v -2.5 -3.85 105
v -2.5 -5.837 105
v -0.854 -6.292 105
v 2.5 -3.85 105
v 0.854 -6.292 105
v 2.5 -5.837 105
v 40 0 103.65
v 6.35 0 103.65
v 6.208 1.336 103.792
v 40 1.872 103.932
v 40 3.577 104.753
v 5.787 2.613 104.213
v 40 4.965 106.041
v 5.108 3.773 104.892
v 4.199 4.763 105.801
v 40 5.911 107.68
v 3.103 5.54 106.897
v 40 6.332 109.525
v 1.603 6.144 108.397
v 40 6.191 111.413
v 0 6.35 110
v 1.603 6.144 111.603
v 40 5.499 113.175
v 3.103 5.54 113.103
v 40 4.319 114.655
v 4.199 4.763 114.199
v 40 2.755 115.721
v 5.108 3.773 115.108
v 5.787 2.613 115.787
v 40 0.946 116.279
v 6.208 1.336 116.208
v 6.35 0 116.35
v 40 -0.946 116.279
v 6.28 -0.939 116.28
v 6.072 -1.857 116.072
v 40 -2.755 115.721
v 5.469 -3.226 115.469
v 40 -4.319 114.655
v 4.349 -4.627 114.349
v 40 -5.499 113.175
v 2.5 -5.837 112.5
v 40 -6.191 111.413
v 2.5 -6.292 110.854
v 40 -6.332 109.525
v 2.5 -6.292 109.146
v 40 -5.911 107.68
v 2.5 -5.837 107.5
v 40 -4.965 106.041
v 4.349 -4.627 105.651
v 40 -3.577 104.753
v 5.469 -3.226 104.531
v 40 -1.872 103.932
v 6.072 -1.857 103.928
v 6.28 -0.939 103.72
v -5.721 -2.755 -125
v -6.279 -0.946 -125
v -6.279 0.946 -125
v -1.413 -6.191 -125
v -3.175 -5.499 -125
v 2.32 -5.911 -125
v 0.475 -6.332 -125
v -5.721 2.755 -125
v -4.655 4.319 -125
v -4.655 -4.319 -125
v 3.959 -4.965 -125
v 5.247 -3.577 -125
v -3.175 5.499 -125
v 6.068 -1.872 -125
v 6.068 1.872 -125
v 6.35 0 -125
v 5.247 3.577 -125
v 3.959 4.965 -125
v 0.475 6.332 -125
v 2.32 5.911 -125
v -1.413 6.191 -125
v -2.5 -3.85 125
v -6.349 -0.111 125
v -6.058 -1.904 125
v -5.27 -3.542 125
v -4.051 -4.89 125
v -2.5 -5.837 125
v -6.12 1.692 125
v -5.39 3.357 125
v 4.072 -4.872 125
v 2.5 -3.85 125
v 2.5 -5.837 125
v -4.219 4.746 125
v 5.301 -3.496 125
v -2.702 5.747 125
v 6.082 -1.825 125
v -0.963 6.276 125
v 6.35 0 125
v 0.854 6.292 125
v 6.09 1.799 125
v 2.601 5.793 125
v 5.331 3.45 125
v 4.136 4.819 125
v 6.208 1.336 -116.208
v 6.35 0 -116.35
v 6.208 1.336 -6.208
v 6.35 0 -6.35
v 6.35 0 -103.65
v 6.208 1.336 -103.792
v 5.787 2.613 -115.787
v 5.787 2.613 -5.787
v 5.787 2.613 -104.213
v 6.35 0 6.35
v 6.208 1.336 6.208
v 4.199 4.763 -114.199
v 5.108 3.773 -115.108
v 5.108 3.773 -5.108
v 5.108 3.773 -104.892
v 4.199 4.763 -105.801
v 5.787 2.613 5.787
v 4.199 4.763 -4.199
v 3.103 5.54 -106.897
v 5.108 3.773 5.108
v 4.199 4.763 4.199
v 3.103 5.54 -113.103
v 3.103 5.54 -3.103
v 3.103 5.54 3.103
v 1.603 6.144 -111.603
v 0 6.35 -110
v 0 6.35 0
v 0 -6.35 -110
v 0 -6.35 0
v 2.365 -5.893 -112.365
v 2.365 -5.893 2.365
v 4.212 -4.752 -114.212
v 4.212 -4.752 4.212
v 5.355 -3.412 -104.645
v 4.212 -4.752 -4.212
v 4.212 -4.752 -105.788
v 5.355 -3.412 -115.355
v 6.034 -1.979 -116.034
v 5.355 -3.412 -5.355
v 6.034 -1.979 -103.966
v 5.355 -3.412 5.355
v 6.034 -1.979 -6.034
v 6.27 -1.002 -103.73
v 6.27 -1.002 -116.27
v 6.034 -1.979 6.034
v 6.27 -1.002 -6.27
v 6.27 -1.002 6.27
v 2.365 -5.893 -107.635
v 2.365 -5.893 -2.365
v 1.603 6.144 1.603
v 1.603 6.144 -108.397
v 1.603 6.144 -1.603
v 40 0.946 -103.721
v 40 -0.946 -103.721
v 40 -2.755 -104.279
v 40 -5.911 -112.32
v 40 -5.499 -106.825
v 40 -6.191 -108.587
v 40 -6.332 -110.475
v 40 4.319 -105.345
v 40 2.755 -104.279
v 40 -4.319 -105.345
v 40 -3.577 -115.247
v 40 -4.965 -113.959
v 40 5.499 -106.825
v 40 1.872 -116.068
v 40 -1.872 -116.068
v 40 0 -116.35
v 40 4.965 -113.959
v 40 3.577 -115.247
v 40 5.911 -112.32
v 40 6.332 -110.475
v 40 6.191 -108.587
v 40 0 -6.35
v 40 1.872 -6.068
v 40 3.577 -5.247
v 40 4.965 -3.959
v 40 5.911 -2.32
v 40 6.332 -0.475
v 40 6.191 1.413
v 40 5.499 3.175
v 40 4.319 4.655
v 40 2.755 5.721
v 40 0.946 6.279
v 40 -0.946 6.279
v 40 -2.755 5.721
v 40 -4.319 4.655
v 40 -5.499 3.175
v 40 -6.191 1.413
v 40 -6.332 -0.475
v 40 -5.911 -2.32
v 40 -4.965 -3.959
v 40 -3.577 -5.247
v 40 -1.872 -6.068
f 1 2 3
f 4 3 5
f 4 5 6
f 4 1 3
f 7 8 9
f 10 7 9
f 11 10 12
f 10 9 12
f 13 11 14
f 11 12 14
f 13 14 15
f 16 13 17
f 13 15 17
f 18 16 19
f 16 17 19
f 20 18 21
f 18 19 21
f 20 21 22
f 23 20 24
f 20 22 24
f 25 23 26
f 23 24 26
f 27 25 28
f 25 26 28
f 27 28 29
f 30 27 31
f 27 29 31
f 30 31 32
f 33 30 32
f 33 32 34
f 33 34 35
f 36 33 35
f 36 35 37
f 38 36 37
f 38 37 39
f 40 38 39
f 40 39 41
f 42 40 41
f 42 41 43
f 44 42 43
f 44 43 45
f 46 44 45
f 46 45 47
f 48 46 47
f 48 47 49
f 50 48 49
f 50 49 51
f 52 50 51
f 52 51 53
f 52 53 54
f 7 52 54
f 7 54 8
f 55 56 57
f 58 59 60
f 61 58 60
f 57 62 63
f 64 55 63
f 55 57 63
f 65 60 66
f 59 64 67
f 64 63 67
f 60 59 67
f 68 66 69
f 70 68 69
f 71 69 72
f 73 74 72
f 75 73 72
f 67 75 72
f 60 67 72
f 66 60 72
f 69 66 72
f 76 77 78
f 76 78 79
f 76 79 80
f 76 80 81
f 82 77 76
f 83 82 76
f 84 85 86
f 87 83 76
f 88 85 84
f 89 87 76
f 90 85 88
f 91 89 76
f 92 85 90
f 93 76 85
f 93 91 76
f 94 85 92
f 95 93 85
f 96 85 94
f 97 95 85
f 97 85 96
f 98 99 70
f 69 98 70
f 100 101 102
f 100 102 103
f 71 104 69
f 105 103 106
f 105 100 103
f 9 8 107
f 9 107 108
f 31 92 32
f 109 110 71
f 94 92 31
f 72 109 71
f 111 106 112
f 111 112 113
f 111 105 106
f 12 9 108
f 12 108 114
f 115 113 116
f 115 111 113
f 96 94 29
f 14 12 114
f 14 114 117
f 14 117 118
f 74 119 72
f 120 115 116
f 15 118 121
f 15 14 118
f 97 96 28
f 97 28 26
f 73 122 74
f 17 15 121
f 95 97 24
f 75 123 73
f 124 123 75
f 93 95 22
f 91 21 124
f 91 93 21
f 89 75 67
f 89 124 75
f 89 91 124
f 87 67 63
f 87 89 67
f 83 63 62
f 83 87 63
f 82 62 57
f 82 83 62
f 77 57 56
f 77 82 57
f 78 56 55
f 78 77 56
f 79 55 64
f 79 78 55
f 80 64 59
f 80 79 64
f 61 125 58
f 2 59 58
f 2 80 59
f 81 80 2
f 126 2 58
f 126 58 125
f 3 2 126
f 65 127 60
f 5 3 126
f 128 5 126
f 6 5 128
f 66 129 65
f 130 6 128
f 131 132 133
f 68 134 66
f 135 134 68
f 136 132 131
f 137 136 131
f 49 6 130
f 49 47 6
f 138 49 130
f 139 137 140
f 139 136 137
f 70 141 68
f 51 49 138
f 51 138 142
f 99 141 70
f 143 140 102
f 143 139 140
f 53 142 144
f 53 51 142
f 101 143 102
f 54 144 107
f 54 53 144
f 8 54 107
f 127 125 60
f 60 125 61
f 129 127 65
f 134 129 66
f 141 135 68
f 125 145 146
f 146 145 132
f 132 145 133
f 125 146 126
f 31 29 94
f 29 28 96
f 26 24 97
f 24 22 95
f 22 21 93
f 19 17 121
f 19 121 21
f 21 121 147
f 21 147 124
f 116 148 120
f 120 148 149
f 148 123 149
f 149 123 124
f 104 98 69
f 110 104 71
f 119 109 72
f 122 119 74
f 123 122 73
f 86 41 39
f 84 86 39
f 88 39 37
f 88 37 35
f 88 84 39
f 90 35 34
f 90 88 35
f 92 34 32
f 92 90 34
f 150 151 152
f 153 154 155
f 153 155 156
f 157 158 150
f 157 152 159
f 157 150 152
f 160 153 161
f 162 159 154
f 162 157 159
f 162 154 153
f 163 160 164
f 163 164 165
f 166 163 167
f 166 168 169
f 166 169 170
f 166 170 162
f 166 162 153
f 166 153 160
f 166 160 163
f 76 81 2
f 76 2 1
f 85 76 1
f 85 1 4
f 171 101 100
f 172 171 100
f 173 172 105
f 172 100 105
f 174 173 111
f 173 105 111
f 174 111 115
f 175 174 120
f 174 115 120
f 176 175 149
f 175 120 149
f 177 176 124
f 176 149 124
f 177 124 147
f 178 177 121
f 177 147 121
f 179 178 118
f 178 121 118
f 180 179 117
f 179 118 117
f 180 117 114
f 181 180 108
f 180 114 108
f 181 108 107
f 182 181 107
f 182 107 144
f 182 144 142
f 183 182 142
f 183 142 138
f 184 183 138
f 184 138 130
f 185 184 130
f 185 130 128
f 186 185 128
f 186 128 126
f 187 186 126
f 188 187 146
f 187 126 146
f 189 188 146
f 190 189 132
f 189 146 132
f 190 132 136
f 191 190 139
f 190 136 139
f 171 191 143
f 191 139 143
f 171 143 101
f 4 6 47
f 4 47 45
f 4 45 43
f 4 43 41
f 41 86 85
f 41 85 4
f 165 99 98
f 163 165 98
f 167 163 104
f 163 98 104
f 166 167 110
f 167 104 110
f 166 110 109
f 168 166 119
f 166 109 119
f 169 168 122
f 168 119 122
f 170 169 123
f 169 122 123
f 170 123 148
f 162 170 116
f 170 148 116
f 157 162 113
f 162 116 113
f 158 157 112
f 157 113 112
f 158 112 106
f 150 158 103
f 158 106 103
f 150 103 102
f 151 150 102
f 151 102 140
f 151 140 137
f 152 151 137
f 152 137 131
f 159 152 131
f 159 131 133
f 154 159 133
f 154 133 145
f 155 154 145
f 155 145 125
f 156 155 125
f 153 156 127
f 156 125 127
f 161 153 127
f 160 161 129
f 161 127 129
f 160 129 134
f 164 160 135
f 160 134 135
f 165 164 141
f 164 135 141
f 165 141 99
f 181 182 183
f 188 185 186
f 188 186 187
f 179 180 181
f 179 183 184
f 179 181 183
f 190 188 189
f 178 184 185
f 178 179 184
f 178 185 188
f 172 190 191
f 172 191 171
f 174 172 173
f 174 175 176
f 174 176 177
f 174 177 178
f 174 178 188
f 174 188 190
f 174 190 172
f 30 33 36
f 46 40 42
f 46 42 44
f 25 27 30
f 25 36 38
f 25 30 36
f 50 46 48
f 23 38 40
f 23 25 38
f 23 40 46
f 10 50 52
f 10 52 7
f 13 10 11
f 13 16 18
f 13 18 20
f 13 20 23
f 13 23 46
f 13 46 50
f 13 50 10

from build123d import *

# Parameters (mm, degrees)
CROQUIS1_R              = 6.35
SALIENTE_EXTRUIR1_DEPTH = 125
CROQUIS2_R              = 6.35
SALIENTE_EXTRUIR2_DEPTH = 40
CROQUIS3_W              = 5
CROQUIS3_H              = 5
CORTAR_EXTRUIR1_DEPTH   = 20


with BuildPart() as part:
    # Croquis1 → Saliente-Extruir1 (new, symmetric)
    with BuildSketch(Plane.XY):
        Circle(CROQUIS1_R)
    extrude(amount=SALIENTE_EXTRUIR1_DEPTH, both=True)

    # Croquis2 → Saliente-Extruir2 (add)
    with BuildSketch(Plane(origin=(0, 0, 0), x_dir=(0, 0, -1), z_dir=(1, 0, 0))):
        Circle(CROQUIS2_R)
        with Locations((110, 0)):
            Circle(CROQUIS2_R)
        with Locations((-110, 0)):
            Circle(CROQUIS2_R)
    extrude(amount=SALIENTE_EXTRUIR2_DEPTH)

    # Croquis3 → Cortar-Extruir1 (cut)
    with BuildSketch(Plane.XY.offset(125)):
        with Locations((0, -6.35)):
            Rectangle(CROQUIS3_W, CROQUIS3_H)
    extrude(amount=-CORTAR_EXTRUIR1_DEPTH, mode=Mode.SUBTRACT)


solid = part.part
